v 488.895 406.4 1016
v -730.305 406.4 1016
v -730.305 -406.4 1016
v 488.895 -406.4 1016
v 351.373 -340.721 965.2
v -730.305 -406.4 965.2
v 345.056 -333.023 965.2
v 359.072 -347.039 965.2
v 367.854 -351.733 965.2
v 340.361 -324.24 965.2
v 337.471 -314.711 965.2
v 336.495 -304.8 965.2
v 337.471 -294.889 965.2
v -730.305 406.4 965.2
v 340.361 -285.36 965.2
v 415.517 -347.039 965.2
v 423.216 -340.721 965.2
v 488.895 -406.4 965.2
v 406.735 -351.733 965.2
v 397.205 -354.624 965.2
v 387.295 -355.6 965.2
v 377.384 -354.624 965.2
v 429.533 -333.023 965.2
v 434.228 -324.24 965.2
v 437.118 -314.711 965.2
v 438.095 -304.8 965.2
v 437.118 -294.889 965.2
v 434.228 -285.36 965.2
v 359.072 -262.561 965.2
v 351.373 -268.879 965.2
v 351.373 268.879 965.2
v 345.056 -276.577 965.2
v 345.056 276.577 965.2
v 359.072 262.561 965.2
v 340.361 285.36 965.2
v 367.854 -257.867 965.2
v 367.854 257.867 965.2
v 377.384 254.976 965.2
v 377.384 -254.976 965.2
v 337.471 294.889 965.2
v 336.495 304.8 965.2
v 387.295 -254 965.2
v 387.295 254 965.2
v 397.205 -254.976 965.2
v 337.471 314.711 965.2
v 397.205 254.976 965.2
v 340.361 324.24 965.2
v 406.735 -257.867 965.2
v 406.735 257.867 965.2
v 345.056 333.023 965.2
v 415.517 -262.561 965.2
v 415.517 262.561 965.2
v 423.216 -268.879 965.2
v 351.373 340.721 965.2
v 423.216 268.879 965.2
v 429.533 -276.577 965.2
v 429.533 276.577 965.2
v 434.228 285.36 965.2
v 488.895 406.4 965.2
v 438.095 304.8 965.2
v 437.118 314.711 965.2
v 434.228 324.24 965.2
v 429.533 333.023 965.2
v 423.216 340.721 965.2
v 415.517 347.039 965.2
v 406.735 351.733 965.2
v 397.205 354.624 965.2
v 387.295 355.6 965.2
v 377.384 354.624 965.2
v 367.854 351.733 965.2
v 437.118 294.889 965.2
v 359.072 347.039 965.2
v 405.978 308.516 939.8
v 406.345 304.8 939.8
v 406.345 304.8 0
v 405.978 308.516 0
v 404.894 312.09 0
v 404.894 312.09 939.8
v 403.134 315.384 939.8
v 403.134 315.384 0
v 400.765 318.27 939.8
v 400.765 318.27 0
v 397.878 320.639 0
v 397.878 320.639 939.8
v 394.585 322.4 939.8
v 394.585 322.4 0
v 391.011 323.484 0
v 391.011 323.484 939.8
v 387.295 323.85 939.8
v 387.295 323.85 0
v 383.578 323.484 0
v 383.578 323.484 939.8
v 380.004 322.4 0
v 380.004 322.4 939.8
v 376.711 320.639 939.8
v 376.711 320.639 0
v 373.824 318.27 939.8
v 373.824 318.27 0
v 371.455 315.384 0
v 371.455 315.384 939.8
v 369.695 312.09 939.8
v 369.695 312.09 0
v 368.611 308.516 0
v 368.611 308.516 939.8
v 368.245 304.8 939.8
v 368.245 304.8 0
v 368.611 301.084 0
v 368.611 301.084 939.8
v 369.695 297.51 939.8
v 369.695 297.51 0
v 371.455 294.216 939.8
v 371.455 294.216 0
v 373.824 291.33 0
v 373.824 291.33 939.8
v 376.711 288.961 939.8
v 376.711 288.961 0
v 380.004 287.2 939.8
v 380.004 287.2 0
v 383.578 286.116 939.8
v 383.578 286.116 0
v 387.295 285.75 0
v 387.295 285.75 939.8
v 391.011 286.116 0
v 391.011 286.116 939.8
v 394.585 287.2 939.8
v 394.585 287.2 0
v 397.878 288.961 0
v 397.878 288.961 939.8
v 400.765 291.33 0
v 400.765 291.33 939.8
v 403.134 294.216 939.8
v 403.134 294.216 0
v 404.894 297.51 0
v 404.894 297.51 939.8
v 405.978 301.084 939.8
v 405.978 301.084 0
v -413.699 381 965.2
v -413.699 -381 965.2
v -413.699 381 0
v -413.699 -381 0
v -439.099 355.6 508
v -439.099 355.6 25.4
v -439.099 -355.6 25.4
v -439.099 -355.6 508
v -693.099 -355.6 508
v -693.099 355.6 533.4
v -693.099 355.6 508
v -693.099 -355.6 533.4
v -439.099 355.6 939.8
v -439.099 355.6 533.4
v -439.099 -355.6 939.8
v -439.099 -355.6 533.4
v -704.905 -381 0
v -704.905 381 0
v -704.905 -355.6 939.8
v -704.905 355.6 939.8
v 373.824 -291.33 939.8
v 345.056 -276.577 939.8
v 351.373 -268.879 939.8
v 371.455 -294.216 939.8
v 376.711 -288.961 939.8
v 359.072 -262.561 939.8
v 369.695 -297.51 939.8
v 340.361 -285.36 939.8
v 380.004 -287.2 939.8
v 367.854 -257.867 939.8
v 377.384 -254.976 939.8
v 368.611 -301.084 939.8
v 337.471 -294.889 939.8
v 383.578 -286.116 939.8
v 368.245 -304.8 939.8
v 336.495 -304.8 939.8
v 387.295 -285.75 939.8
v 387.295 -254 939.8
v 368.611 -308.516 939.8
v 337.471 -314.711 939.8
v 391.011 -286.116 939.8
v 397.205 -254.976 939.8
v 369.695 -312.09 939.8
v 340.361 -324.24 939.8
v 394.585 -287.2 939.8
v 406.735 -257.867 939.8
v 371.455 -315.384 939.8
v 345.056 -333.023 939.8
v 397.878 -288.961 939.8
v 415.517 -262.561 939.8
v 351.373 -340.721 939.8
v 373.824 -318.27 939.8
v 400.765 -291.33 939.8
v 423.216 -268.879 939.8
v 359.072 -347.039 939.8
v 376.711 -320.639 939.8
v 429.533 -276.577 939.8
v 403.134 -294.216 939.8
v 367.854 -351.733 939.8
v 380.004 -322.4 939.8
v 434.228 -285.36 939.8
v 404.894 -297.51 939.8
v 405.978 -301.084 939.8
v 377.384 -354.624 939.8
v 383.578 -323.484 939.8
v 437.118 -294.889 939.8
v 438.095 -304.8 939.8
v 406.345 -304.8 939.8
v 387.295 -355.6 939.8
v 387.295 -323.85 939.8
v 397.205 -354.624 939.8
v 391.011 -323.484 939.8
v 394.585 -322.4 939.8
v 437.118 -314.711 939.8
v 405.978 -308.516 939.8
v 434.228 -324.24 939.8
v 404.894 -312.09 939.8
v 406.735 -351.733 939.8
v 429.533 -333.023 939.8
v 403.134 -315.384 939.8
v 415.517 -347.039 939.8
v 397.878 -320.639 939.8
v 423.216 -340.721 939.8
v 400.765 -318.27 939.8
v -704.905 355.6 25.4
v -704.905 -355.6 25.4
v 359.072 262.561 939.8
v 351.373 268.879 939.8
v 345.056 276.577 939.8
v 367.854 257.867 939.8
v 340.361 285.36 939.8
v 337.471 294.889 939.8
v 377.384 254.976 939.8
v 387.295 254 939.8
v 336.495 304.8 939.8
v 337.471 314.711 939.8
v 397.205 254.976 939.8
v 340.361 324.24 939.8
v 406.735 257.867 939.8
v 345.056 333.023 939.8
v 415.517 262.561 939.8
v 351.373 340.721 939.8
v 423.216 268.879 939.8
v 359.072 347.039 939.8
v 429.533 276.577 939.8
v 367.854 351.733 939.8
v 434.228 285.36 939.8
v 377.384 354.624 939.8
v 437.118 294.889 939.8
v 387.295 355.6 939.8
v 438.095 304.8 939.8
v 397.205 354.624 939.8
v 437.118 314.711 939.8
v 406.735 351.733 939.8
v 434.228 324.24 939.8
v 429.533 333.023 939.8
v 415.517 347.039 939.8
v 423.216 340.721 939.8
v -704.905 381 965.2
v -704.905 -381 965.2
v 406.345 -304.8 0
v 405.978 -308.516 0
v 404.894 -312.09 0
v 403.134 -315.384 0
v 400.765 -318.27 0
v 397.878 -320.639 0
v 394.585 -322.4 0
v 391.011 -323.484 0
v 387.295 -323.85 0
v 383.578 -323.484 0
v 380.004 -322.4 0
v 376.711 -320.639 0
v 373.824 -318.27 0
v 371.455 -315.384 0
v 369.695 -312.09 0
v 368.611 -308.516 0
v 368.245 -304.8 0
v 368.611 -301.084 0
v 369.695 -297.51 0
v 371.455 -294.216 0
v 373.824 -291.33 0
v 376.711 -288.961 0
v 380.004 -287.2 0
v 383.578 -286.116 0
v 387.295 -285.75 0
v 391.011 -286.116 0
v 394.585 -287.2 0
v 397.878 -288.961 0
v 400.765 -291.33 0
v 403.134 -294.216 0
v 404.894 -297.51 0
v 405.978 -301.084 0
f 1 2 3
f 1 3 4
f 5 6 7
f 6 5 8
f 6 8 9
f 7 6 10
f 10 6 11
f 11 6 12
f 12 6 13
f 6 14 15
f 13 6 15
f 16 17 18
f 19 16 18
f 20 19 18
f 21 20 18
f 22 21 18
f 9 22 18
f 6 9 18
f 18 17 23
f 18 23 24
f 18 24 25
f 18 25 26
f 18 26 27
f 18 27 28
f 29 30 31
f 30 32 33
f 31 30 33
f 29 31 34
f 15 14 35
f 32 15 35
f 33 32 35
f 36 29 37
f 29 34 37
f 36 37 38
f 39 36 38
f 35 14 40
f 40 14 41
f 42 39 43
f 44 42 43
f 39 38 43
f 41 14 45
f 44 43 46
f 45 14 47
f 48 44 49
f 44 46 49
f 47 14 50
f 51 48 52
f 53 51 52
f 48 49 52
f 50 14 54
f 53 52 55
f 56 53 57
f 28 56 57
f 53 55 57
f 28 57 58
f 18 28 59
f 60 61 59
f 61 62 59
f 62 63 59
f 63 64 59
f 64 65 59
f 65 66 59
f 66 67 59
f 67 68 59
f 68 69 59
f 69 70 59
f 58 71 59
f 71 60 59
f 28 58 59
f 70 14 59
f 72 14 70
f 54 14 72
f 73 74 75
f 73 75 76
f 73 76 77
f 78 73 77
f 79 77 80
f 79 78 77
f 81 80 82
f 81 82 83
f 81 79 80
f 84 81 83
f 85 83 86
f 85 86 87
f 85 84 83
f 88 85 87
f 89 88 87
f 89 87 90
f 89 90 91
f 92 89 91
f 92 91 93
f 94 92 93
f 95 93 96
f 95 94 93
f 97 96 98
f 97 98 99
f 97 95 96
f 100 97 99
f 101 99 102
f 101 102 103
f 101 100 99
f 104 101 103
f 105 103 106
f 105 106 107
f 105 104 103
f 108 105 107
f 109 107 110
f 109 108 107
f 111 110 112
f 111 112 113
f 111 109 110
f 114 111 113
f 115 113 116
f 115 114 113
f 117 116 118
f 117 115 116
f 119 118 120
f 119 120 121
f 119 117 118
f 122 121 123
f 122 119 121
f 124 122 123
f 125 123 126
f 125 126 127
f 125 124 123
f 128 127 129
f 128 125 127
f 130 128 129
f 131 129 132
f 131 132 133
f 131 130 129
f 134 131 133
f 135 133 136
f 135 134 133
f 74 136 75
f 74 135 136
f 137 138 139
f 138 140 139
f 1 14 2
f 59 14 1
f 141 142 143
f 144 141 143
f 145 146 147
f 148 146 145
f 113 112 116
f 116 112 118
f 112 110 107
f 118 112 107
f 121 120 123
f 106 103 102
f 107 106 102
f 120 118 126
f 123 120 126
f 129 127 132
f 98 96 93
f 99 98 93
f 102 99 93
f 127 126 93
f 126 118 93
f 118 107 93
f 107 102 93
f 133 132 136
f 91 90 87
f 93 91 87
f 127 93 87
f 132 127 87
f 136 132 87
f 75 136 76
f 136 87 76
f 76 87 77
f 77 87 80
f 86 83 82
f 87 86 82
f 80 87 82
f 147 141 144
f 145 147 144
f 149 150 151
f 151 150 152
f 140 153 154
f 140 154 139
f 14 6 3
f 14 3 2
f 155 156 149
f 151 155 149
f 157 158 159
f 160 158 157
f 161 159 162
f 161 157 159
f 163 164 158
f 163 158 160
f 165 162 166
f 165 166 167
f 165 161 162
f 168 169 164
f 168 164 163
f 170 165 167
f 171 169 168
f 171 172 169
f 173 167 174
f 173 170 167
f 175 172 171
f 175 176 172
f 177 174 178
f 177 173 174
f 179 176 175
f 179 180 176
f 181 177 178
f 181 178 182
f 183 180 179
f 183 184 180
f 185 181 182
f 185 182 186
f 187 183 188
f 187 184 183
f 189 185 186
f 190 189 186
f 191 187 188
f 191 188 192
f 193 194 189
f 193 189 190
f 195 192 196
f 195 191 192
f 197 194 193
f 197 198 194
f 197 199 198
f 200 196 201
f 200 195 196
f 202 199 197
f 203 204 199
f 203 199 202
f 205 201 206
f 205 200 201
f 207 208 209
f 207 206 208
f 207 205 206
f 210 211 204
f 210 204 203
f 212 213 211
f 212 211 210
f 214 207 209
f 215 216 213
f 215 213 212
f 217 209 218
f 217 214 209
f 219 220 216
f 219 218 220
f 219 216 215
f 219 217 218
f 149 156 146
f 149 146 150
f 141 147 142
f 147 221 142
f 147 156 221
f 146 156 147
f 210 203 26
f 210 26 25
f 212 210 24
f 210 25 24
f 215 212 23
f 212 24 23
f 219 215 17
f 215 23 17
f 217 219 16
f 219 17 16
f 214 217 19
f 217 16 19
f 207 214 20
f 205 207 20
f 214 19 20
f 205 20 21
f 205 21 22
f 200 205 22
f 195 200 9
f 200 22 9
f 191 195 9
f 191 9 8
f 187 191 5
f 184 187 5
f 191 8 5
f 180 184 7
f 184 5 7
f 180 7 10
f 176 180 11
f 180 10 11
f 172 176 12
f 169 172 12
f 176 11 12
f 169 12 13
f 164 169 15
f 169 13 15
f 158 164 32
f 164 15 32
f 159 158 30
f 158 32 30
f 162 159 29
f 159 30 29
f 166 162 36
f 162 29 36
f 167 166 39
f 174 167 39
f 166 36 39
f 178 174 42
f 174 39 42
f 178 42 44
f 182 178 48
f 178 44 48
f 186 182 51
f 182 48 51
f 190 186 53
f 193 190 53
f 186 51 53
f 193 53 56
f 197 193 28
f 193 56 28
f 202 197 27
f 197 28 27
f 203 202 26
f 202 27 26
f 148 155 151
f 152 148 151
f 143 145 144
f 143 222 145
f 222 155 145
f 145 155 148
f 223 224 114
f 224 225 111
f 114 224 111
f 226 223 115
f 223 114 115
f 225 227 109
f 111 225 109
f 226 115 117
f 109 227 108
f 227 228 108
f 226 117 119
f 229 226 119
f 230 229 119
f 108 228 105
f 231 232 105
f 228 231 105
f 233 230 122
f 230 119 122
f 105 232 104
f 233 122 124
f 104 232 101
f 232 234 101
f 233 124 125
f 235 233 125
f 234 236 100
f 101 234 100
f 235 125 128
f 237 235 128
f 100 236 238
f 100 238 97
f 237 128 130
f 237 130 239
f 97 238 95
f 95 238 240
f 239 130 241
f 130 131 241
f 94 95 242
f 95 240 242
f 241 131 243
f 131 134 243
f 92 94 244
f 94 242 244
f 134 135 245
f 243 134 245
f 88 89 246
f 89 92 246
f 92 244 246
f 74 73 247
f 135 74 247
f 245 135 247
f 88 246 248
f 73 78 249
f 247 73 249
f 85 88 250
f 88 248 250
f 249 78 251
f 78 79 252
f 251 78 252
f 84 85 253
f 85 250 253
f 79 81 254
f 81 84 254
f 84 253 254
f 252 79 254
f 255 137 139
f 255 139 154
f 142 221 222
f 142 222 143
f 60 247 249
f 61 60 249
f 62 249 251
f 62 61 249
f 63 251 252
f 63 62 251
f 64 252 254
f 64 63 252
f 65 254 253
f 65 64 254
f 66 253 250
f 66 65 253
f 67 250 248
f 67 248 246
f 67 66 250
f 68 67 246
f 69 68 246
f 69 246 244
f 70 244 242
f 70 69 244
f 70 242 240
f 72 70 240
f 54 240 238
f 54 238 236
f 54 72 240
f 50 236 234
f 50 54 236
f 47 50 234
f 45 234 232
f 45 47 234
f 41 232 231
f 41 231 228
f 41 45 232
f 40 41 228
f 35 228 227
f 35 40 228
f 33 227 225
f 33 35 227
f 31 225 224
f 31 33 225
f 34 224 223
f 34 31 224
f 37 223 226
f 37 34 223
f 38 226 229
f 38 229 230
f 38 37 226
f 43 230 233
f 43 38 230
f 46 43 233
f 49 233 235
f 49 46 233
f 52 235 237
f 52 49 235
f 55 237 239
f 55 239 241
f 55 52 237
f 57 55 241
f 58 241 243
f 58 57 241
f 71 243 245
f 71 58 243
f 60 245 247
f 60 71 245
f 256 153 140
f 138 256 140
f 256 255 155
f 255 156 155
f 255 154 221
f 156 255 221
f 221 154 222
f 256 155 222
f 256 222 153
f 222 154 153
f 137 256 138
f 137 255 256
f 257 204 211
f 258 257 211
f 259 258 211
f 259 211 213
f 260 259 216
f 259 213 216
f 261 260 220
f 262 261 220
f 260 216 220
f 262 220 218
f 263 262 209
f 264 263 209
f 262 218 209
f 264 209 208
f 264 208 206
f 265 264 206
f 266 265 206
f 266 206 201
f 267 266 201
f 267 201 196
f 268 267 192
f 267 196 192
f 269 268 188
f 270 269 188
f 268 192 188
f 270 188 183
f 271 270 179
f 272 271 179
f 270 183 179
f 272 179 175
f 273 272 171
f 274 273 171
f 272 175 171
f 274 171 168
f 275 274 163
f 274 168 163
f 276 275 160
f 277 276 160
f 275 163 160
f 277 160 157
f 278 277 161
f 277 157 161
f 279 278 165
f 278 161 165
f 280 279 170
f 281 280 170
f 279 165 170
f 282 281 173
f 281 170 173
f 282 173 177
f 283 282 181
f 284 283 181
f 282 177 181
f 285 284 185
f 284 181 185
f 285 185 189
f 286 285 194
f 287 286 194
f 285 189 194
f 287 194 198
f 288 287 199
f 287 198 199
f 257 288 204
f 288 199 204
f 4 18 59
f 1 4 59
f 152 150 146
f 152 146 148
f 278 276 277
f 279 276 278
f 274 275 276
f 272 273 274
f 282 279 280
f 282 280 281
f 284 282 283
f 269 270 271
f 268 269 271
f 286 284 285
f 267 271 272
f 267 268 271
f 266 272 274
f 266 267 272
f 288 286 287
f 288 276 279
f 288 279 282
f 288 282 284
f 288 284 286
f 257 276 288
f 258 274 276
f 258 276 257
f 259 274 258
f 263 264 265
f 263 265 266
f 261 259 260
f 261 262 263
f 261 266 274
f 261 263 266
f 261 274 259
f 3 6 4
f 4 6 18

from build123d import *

# Parameters (mm, degrees)
F0_W      = 291.2060667798
F0_H      = 762
F1_DEPTH  = 25.4
F2_W      = 265.8060667798
F2_H      = 25.4
F3_DEPTH  = 914.4
F5_W      = 265.8060667798
F5_H      = 711.2
F6_DEPTH  = 25.4
F8_W      = 1219.2
F8_H      = 812.8
F8_W_2    = 291.2060667798
F8_H_2    = 762
F9_DEPTH  = 50.8
F10_R     = 50.8
F11_DEPTH = 25.4
F12_R     = 19.05
F13_DEPTH = 939.8
F17_W     = 711.2
F17_H     = 25.4
F18_DEPTH = 254


# Not quite as in the source:
# - a feature names something its author has since deleted; it is built from what else it names


with BuildPart() as f1:
    # F0 (on Top) → F1 (new body)
    with BuildSketch(Plane.XY):
        with Locations((-559.3024502769, 0)):
            Rectangle(F0_W, F0_H)
    extrude(amount=F1_DEPTH)

    # F2 (on face) → F3 (join)
    with BuildSketch(Plane.XY.offset(25.4)):
        Polygon((-413.699416887, -381), (-413.699416887, 381), (-439.099416887, 381), (-439.099416887, 355.6), (-439.099416887, -355.6), (-439.099416887, -381), align=None)
        with Locations((-572.0024502769, 368.3)):
            Rectangle(F2_W, F2_H)
        with Locations((-572.0024502769, -368.3)):
            Rectangle(F2_W, F2_H)
    extrude(amount=F3_DEPTH)

    # F5 (on offset) → F6 (join)
    with BuildSketch(Plane.XY.offset(939.8)):
        with Locations((-572.0024502769, 0)):
            Rectangle(F5_W, F5_H)
        Polygon((-413.699416887, 381), (-704.9054836667, 381), (-704.9054836667, 355.6), (-439.099416887, 355.6), (-439.099416887, -355.6), (-704.9054836667, -355.6), (-704.9054836667, -381), (-413.699416887, -381), align=None)
    extrude(amount=F6_DEPTH)

    # F17 (on face) → F18 (join)
    with BuildSketch(Plane(origin=(-439.099416887, 0, 0), x_dir=(0, -1, 0), z_dir=(-1, 0, 0))):
        with Locations((0, 520.7)):
            Rectangle(F17_W, F17_H)
    extrude(amount=F18_DEPTH)


with BuildPart() as f9:
    # F8 (on offset) → F9 (new body)
    with BuildSketch(Plane.XY.offset(965.2)):
        with Locations((-120.7054836667, 0)):
            Rectangle(F8_W, F8_H)
        with Locations((-559.3024502769, 0)):
            Rectangle(F8_W_2, F8_H_2, mode=Mode.SUBTRACT)
        with Locations((-559.3024502769, 0)):
            Rectangle(F8_W_2, F8_H_2)
    extrude(amount=F9_DEPTH)

    # F10 (on face) → F11 (join)
    with BuildSketch(Plane(origin=(0, 0, 965.2), x_dir=(1, 0, 0), z_dir=(0, 0, -1))):
        with Locations((387.2945163333, 304.8)):
            Circle(F10_R)
    extrude(amount=F11_DEPTH)

    # F12 (on face) → F13 (join)
    with BuildSketch(Plane(origin=(0, 0, 939.8), x_dir=(1, 0, 0), z_dir=(0, 0, -1))):
        with Locations((387.2945163333, 304.8)):
            Circle(F12_R)
    extrude(amount=F13_DEPTH)

    # F16: F9 across plane


with BuildPart() as f9_1:
    add(f9.part)
    add(f9.part.mirror(Plane(origin=(0, 0, 0), x_dir=(-1, 0, 0), z_dir=(0, 1, 0))))


solid = Compound([f1.part, f9_1.part])
